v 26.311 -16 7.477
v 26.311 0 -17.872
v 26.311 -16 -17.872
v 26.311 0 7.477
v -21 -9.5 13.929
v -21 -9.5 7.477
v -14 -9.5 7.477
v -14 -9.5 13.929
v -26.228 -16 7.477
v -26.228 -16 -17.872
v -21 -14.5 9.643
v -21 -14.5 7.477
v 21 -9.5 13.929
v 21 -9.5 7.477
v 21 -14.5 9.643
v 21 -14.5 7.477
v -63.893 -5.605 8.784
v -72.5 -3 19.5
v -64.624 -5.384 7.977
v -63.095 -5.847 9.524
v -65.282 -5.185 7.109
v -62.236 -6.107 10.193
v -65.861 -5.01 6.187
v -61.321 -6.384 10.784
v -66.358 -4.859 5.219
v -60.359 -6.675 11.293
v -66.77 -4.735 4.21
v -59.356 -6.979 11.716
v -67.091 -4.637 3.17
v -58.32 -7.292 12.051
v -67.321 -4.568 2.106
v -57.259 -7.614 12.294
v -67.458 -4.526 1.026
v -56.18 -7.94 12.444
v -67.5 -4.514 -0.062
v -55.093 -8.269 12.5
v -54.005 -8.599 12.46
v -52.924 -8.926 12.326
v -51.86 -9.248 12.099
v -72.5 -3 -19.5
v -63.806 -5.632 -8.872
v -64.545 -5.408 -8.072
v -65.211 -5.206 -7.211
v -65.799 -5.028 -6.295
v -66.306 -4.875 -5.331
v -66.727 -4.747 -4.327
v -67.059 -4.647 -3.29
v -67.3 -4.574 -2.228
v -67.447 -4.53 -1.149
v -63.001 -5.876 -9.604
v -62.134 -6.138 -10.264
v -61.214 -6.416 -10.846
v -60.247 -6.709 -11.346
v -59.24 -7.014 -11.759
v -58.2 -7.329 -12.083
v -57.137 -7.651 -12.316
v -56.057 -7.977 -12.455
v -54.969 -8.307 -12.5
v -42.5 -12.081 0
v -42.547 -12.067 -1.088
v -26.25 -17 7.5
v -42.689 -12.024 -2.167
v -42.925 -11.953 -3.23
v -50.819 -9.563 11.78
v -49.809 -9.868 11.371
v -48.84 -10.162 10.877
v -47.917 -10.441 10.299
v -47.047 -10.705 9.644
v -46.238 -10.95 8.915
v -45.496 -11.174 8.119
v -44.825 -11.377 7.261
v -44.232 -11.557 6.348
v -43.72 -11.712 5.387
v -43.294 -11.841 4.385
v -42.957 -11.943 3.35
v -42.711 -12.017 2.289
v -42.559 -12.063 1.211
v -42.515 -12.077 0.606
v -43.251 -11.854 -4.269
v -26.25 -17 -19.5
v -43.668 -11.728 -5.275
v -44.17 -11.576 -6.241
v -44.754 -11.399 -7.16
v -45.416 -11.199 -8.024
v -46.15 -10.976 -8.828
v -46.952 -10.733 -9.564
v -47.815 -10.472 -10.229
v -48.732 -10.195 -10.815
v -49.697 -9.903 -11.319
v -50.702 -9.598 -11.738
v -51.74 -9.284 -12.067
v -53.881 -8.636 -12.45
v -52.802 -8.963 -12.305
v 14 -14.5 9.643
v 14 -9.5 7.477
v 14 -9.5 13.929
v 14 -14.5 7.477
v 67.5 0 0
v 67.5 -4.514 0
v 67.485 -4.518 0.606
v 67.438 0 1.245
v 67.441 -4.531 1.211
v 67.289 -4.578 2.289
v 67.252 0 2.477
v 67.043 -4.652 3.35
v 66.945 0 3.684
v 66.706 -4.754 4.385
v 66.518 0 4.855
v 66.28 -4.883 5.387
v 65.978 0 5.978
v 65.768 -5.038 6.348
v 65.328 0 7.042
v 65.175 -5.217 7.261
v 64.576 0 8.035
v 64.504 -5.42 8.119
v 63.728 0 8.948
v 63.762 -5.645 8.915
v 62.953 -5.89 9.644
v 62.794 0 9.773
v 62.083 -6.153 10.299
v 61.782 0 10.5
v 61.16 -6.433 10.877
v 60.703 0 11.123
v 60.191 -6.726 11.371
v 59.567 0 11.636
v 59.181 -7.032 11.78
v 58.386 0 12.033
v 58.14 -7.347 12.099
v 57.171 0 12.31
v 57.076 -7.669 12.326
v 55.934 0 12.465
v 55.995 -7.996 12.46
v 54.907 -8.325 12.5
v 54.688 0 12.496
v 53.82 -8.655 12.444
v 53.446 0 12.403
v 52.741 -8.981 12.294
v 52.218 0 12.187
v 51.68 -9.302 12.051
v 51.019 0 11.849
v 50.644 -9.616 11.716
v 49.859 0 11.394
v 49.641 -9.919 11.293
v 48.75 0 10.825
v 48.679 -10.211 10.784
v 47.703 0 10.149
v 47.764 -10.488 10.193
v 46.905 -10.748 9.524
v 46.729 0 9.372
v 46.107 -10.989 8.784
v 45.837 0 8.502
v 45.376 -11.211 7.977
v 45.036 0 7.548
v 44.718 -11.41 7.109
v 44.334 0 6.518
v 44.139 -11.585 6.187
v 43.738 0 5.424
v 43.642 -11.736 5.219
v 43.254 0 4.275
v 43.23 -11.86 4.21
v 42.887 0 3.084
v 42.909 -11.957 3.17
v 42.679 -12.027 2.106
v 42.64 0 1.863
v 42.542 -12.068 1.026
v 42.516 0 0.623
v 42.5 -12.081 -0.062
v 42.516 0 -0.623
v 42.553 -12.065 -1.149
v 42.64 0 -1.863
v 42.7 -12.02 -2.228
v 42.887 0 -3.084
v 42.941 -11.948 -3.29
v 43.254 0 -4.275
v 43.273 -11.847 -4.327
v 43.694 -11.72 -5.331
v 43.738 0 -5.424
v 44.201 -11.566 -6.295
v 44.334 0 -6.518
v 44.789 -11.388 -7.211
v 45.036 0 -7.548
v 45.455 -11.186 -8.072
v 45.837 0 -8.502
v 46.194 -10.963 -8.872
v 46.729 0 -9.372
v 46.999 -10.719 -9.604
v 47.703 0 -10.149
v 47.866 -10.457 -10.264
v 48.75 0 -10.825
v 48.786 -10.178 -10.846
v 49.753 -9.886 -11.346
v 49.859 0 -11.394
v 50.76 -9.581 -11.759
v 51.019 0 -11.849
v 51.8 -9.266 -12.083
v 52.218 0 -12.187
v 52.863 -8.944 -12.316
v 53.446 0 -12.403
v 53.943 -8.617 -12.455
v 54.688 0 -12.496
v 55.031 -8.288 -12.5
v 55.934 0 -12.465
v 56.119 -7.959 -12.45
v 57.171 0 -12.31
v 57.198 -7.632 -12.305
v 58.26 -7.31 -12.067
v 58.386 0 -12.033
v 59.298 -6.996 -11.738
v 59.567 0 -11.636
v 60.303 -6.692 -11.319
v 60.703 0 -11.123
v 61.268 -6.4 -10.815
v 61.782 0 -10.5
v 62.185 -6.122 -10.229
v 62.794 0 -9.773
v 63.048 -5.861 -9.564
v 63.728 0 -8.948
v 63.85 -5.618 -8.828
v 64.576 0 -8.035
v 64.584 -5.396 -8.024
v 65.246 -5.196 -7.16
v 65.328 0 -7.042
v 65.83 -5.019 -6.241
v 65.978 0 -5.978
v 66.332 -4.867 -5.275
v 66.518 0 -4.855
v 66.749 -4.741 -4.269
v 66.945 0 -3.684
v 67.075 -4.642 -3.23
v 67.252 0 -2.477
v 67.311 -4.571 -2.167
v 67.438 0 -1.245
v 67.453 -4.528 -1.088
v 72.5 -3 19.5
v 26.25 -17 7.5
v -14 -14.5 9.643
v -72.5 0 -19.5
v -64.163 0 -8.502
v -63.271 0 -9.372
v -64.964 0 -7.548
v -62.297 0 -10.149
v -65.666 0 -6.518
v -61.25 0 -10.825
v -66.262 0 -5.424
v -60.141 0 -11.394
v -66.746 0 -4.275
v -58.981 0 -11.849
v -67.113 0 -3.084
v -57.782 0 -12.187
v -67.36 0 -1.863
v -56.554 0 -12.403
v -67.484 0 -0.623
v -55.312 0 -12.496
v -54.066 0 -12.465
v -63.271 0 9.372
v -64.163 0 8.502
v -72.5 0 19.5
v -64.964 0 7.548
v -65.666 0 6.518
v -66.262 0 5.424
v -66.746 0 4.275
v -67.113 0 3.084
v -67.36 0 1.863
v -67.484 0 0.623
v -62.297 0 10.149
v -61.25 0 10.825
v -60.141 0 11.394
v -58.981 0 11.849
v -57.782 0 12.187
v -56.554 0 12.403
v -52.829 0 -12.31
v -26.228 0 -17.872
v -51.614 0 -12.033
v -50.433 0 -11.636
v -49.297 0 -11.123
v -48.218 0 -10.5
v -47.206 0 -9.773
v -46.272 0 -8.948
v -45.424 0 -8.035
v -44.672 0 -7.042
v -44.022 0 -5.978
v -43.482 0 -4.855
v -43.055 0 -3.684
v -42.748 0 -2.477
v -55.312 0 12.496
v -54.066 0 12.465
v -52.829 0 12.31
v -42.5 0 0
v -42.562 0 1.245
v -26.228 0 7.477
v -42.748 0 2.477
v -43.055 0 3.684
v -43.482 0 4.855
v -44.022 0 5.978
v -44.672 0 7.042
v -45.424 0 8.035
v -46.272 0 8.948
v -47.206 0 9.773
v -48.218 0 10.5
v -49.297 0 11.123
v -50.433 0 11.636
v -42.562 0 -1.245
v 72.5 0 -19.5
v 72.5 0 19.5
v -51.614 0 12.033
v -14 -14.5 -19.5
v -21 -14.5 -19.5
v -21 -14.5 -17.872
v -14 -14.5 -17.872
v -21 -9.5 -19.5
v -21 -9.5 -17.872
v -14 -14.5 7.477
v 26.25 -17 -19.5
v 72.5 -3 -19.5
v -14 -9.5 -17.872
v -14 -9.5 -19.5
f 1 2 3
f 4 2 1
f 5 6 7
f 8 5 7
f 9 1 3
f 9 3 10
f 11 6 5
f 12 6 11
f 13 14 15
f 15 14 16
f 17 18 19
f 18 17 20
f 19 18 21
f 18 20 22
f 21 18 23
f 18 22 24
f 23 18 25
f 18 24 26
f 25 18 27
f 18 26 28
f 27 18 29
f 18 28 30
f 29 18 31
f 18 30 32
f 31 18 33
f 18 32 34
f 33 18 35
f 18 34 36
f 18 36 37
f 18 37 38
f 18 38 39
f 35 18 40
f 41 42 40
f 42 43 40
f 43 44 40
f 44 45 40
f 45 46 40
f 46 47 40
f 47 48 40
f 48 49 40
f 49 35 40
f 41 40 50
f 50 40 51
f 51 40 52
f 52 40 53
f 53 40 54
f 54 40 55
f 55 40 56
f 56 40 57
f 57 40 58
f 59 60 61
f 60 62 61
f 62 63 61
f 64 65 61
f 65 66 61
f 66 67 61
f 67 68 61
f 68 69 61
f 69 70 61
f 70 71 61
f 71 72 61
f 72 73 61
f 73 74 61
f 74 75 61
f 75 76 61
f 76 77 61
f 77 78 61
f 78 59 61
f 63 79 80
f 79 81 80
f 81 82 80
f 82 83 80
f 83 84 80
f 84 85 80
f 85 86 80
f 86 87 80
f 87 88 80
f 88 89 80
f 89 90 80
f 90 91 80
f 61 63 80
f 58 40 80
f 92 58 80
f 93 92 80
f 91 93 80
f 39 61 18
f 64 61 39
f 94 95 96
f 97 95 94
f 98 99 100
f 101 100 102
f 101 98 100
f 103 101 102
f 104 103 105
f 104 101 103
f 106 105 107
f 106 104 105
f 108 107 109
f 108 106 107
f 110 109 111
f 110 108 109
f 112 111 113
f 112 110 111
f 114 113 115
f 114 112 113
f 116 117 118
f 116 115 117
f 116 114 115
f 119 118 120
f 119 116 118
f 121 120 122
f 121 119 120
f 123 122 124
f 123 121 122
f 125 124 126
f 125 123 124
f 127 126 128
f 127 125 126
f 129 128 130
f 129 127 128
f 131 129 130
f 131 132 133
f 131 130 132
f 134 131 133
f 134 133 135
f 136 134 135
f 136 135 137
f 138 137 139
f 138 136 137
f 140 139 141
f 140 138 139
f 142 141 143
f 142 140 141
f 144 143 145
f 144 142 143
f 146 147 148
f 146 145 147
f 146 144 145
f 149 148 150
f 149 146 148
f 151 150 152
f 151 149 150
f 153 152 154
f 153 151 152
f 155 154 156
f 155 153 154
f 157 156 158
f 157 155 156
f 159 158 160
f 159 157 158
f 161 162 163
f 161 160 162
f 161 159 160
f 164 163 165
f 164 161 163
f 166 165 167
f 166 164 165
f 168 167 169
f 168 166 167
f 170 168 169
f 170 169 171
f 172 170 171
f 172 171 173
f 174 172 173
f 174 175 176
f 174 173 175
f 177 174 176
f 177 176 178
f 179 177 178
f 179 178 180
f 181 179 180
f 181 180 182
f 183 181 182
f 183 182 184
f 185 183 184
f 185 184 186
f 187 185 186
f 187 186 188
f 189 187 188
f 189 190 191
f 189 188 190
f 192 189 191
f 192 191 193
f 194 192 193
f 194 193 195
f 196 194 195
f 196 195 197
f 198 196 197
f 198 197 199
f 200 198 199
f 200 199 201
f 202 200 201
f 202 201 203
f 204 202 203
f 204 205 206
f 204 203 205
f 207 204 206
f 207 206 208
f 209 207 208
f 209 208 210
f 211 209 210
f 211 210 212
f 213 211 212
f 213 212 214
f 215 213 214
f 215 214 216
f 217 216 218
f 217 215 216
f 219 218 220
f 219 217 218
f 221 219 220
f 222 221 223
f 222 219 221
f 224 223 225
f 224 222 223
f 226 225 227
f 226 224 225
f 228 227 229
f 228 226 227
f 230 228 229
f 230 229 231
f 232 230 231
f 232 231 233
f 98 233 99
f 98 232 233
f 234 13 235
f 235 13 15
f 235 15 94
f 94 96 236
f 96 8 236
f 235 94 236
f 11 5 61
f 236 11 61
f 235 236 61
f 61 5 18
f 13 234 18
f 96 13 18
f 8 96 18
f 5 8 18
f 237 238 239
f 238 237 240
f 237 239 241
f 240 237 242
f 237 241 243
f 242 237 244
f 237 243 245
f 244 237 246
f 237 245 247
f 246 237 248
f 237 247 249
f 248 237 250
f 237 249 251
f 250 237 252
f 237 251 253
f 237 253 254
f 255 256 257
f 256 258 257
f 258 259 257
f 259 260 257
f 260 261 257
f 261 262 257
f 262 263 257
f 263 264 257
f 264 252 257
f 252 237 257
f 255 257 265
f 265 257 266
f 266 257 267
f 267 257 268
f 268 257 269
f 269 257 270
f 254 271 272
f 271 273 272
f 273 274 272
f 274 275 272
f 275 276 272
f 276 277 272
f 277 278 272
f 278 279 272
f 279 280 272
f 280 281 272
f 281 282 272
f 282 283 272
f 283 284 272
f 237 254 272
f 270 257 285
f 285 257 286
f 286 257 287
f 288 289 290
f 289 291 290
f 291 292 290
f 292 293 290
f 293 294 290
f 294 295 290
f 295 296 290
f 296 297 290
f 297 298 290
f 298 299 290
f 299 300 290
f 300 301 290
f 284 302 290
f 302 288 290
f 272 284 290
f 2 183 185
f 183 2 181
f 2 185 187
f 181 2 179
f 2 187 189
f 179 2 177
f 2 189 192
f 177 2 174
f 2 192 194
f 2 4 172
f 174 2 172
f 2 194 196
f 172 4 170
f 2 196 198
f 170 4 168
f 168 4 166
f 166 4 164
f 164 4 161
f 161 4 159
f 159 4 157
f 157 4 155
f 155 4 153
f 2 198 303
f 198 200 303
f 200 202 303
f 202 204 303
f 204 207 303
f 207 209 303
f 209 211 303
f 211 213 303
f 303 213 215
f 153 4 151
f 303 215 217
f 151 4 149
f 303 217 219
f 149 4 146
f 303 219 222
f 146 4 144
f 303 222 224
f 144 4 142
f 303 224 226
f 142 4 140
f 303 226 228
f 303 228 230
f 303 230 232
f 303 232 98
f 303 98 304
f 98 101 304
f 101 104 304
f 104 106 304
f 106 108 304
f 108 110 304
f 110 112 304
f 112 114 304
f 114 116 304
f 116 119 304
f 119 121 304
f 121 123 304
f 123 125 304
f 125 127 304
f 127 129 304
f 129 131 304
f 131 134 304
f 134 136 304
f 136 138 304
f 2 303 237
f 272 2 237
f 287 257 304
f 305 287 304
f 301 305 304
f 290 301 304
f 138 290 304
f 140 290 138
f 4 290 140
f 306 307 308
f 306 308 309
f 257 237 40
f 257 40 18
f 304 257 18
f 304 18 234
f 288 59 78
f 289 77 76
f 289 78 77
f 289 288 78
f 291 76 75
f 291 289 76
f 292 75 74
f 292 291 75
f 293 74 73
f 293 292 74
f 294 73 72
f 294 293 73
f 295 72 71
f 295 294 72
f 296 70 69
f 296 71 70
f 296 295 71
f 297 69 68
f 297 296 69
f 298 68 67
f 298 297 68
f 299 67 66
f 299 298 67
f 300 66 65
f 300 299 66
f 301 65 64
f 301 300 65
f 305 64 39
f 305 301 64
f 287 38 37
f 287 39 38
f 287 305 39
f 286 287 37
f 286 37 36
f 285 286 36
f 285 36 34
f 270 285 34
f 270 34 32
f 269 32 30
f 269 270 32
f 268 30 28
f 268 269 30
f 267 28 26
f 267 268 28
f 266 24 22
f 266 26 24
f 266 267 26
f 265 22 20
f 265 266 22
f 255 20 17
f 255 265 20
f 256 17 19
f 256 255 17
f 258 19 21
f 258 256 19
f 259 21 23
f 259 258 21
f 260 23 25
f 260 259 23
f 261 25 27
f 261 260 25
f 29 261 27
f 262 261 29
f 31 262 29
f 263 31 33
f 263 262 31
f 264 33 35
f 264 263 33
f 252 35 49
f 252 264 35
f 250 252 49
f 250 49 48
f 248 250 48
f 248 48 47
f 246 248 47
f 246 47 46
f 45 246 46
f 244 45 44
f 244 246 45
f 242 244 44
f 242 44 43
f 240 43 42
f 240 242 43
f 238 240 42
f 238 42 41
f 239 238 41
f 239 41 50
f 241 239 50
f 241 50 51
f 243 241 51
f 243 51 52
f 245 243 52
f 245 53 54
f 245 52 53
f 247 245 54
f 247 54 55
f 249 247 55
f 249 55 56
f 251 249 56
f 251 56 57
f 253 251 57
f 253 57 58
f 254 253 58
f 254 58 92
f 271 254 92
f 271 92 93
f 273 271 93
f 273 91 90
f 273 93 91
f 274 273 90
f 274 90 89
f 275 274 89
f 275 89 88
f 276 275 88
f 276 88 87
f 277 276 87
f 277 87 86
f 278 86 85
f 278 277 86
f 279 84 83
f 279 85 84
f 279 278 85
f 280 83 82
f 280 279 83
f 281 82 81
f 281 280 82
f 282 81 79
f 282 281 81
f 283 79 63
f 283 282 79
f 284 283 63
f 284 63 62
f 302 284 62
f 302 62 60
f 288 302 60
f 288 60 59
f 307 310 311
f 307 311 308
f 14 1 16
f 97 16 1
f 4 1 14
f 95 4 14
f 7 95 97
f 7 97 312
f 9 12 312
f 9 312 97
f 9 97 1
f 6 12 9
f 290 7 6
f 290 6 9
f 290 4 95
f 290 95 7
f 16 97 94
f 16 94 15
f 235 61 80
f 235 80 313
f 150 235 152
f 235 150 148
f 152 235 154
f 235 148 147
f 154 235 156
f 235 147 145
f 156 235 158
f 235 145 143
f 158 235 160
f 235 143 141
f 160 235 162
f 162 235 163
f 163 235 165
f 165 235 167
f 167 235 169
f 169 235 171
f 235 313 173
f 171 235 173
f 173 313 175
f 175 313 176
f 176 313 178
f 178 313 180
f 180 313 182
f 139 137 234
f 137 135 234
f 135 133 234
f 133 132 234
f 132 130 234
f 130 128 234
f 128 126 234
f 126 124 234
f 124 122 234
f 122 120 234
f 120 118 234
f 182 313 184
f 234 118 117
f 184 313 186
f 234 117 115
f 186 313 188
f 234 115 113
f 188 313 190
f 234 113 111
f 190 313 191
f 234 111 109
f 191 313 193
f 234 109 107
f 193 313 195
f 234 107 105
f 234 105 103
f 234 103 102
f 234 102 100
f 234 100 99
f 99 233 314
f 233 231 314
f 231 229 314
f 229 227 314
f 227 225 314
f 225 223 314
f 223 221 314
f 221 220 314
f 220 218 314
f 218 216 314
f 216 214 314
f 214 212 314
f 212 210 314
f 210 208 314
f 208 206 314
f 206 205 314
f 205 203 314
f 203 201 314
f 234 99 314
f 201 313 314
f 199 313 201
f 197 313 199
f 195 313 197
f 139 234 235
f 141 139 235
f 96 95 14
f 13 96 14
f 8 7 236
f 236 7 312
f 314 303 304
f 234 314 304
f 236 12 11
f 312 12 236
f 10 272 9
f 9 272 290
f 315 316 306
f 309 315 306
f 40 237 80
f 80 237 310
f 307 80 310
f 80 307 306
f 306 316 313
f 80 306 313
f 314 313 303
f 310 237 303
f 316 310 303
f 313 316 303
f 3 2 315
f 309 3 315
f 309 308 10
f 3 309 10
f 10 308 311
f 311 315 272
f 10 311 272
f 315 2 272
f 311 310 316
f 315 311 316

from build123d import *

# Parameters (mm, degrees)
F0_W      = 145
F0_H      = 39
F0_R      = 12.5
F1_DEPTH  = 17
F4_DEPTH  = 300
F6_DEPTH  = 100
F7_W      = 7
F7_H      = 5
F8_DEPTH  = 200
F9_W      = 10.465479
F9_H      = 7.249243
F10_DEPTH = 3
F11_W     = 52.539315
F11_H     = 25.348472
F12_DEPTH = 16


with BuildPart() as f1:
    # F0 (on Front) → F1 (new body)
    with BuildSketch(Plane.XZ):
        Rectangle(F0_W, F0_H)
        with Locations((-55, 0)):
            Circle(F0_R, mode=Mode.SUBTRACT)
        with Locations((55, 0)):
            Circle(F0_R, mode=Mode.SUBTRACT)
    extrude(amount=F1_DEPTH)

    # F3 (on face) → F4 (cut)
    with BuildSketch(Plane(origin=(-72.5, 0, 0), x_dir=(0, -1, 0), z_dir=(-1, 0, 0))):
        Polygon((3, 19.5), (17, 7.5), (17, 19.5), align=None)
    extrude(amount=-F4_DEPTH, mode=Mode.SUBTRACT)

    # F5 (on face) → F6 (cut)
    with BuildSketch(Plane(origin=(0, 0, -19.5), x_dir=(1, 0, 0), z_dir=(0, 0, -1))):
        Polygon((-72.5, 3), (-26.25, 17), (-72.5, 17), align=None)
        Polygon((72.5, 17), (26.25, 17), (72.5, 3), align=None)
    extrude(amount=-F6_DEPTH, mode=Mode.SUBTRACT)

    # F7 (on face) → F8 (cut)
    with BuildSketch(Plane(origin=(0, 0, -19.5), x_dir=(1, 0, 0), z_dir=(0, 0, -1))):
        with Locations((-17.5, 12)):
            Rectangle(F7_W, F7_H)
        with Locations((17.5, 12)):
            Rectangle(F7_W, F7_H)
    extrude(amount=-F8_DEPTH, mode=Mode.SUBTRACT)

    # F9 (on face) → F10 (join)
    with BuildSketch(Plane(origin=(0, 0, -19.5), x_dir=(1, 0, 0), z_dir=(0, 0, -1))):
        with Locations((17.402842, 12.139229)):
            Rectangle(F9_W, F9_H)
    extrude(amount=-F10_DEPTH)

    # F11 (on face) → F12 (cut)
    with BuildSketch(Plane(origin=(0, 0, 0), x_dir=(-1, 0, 0), z_dir=(0, 1, 0))):
        with Locations((-0.041759, -5.197565)):
            Rectangle(F11_W, F11_H)
    extrude(amount=-F12_DEPTH, mode=Mode.SUBTRACT)


solid = f1.part
